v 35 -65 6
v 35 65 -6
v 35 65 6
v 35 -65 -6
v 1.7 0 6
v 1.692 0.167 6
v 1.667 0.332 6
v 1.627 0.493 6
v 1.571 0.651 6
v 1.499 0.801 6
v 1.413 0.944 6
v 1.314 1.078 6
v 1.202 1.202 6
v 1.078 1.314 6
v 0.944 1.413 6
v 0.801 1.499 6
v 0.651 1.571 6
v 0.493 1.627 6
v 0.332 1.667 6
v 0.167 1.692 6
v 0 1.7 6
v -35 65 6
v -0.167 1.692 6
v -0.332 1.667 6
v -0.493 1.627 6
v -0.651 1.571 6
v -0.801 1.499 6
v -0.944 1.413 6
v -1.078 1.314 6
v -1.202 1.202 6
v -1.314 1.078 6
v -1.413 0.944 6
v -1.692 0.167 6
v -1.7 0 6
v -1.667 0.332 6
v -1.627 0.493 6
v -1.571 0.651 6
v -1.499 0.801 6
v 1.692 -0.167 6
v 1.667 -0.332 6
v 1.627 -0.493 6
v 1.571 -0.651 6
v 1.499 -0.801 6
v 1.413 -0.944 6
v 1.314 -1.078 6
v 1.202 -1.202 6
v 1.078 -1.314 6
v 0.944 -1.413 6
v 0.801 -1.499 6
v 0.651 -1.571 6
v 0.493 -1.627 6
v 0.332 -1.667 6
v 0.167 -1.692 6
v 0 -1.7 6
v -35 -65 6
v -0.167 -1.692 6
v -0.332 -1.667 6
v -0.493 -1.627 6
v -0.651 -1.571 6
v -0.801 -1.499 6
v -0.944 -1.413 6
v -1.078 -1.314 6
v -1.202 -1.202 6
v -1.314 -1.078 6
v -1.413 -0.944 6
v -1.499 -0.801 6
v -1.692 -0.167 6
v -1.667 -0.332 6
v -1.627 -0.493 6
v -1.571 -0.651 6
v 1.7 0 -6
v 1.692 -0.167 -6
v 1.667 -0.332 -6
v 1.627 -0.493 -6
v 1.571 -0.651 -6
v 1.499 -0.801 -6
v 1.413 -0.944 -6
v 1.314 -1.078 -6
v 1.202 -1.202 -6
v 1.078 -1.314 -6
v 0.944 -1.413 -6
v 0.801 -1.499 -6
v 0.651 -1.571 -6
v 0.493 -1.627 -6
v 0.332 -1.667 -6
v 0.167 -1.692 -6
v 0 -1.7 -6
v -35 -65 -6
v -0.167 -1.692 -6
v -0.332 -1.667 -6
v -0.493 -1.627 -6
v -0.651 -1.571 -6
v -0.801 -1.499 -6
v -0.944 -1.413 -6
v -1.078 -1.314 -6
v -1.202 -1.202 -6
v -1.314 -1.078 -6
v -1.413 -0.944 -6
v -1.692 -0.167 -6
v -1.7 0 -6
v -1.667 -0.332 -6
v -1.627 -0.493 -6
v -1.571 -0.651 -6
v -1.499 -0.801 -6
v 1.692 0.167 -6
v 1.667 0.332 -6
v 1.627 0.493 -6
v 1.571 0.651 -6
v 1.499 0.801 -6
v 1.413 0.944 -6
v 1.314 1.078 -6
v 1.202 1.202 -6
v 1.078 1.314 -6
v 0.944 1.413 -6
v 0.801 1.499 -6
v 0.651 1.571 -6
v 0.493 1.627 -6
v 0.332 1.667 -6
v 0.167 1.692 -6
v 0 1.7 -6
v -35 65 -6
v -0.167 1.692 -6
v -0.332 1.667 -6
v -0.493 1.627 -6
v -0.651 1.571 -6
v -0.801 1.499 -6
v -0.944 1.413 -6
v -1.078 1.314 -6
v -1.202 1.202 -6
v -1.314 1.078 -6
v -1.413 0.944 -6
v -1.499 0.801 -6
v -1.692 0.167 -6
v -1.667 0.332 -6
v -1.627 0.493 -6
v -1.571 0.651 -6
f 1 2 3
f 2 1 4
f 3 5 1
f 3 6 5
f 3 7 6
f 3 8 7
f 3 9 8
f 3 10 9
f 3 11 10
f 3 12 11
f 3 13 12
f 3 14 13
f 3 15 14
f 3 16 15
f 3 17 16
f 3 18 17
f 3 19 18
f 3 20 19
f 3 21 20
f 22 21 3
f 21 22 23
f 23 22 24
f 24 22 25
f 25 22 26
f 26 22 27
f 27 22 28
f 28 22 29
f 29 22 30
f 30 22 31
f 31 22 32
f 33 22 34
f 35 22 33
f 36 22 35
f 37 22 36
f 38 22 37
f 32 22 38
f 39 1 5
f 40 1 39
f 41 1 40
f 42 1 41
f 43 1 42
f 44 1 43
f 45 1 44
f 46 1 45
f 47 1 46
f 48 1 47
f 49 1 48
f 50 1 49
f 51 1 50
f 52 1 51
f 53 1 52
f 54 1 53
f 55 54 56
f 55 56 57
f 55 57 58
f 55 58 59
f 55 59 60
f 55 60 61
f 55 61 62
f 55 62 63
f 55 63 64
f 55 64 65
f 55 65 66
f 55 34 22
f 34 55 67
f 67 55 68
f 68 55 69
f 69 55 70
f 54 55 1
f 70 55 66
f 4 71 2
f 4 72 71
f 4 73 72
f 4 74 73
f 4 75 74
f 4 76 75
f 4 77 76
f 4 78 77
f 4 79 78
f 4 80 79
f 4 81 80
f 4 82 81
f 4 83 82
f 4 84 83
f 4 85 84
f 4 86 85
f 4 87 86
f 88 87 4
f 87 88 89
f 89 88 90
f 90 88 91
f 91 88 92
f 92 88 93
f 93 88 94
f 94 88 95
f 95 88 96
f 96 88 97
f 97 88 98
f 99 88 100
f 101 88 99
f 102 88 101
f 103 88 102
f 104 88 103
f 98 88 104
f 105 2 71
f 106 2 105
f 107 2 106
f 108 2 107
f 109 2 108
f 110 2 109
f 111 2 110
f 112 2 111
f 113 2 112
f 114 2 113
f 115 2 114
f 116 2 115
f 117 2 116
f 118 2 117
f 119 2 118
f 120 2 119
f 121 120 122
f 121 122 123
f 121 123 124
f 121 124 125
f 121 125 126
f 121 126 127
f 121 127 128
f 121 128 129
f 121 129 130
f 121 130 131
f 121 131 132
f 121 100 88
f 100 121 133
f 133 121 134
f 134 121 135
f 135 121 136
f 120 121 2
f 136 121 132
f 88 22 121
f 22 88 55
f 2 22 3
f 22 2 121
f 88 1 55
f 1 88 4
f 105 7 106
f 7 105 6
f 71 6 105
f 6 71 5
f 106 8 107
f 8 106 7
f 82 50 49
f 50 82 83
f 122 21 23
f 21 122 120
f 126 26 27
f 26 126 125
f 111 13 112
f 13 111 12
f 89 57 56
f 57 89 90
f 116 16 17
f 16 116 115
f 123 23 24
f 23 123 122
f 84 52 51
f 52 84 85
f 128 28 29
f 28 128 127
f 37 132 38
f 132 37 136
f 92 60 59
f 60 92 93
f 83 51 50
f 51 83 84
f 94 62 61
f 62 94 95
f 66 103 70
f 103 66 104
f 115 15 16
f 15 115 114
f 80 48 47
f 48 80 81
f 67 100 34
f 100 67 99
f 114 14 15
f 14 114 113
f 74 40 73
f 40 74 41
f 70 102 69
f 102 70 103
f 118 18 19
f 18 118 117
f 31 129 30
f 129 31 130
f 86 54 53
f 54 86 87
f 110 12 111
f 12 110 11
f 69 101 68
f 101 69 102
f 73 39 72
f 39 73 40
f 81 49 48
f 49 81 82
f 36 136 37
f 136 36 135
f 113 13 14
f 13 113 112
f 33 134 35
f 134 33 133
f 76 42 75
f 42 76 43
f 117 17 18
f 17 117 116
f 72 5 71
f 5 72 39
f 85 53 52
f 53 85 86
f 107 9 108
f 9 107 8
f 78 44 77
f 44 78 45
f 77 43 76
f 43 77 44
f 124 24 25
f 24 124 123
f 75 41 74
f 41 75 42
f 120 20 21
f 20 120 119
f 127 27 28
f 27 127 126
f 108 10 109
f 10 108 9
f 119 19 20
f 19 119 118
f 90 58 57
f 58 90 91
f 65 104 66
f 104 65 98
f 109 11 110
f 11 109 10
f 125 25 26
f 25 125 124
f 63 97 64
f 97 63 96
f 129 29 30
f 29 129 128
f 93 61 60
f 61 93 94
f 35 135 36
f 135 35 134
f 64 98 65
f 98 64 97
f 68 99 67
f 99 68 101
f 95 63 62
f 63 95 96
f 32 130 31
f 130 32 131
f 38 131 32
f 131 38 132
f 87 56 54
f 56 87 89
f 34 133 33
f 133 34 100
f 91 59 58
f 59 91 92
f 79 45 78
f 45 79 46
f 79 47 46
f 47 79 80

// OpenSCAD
render_fn = 64;
$fn = render_fn;
set = "__PLAMP_PART__"; // [__PLAMP_PART__, assembly]

part_w = 70;
part_d = 130;
part_h = 12;
boolean_overlap = 0.1;

module __PLAMP_PART___positive() {
    cube([part_w, part_d, part_h], center = true);
}

module __PLAMP_PART___negative() {
    echo("BOM", "M3x16 screw", 1);
    cylinder(d = 3.4, h = part_h + 2 * boolean_overlap, center = true);
}

module __PLAMP_PART__() {
    difference() {
        __PLAMP_PART___positive();
        __PLAMP_PART___negative();
    }
}

if (set == "__PLAMP_PART__") {
    __PLAMP_PART__();
} else if (set == "assembly") {
    __PLAMP_PART__();
}
